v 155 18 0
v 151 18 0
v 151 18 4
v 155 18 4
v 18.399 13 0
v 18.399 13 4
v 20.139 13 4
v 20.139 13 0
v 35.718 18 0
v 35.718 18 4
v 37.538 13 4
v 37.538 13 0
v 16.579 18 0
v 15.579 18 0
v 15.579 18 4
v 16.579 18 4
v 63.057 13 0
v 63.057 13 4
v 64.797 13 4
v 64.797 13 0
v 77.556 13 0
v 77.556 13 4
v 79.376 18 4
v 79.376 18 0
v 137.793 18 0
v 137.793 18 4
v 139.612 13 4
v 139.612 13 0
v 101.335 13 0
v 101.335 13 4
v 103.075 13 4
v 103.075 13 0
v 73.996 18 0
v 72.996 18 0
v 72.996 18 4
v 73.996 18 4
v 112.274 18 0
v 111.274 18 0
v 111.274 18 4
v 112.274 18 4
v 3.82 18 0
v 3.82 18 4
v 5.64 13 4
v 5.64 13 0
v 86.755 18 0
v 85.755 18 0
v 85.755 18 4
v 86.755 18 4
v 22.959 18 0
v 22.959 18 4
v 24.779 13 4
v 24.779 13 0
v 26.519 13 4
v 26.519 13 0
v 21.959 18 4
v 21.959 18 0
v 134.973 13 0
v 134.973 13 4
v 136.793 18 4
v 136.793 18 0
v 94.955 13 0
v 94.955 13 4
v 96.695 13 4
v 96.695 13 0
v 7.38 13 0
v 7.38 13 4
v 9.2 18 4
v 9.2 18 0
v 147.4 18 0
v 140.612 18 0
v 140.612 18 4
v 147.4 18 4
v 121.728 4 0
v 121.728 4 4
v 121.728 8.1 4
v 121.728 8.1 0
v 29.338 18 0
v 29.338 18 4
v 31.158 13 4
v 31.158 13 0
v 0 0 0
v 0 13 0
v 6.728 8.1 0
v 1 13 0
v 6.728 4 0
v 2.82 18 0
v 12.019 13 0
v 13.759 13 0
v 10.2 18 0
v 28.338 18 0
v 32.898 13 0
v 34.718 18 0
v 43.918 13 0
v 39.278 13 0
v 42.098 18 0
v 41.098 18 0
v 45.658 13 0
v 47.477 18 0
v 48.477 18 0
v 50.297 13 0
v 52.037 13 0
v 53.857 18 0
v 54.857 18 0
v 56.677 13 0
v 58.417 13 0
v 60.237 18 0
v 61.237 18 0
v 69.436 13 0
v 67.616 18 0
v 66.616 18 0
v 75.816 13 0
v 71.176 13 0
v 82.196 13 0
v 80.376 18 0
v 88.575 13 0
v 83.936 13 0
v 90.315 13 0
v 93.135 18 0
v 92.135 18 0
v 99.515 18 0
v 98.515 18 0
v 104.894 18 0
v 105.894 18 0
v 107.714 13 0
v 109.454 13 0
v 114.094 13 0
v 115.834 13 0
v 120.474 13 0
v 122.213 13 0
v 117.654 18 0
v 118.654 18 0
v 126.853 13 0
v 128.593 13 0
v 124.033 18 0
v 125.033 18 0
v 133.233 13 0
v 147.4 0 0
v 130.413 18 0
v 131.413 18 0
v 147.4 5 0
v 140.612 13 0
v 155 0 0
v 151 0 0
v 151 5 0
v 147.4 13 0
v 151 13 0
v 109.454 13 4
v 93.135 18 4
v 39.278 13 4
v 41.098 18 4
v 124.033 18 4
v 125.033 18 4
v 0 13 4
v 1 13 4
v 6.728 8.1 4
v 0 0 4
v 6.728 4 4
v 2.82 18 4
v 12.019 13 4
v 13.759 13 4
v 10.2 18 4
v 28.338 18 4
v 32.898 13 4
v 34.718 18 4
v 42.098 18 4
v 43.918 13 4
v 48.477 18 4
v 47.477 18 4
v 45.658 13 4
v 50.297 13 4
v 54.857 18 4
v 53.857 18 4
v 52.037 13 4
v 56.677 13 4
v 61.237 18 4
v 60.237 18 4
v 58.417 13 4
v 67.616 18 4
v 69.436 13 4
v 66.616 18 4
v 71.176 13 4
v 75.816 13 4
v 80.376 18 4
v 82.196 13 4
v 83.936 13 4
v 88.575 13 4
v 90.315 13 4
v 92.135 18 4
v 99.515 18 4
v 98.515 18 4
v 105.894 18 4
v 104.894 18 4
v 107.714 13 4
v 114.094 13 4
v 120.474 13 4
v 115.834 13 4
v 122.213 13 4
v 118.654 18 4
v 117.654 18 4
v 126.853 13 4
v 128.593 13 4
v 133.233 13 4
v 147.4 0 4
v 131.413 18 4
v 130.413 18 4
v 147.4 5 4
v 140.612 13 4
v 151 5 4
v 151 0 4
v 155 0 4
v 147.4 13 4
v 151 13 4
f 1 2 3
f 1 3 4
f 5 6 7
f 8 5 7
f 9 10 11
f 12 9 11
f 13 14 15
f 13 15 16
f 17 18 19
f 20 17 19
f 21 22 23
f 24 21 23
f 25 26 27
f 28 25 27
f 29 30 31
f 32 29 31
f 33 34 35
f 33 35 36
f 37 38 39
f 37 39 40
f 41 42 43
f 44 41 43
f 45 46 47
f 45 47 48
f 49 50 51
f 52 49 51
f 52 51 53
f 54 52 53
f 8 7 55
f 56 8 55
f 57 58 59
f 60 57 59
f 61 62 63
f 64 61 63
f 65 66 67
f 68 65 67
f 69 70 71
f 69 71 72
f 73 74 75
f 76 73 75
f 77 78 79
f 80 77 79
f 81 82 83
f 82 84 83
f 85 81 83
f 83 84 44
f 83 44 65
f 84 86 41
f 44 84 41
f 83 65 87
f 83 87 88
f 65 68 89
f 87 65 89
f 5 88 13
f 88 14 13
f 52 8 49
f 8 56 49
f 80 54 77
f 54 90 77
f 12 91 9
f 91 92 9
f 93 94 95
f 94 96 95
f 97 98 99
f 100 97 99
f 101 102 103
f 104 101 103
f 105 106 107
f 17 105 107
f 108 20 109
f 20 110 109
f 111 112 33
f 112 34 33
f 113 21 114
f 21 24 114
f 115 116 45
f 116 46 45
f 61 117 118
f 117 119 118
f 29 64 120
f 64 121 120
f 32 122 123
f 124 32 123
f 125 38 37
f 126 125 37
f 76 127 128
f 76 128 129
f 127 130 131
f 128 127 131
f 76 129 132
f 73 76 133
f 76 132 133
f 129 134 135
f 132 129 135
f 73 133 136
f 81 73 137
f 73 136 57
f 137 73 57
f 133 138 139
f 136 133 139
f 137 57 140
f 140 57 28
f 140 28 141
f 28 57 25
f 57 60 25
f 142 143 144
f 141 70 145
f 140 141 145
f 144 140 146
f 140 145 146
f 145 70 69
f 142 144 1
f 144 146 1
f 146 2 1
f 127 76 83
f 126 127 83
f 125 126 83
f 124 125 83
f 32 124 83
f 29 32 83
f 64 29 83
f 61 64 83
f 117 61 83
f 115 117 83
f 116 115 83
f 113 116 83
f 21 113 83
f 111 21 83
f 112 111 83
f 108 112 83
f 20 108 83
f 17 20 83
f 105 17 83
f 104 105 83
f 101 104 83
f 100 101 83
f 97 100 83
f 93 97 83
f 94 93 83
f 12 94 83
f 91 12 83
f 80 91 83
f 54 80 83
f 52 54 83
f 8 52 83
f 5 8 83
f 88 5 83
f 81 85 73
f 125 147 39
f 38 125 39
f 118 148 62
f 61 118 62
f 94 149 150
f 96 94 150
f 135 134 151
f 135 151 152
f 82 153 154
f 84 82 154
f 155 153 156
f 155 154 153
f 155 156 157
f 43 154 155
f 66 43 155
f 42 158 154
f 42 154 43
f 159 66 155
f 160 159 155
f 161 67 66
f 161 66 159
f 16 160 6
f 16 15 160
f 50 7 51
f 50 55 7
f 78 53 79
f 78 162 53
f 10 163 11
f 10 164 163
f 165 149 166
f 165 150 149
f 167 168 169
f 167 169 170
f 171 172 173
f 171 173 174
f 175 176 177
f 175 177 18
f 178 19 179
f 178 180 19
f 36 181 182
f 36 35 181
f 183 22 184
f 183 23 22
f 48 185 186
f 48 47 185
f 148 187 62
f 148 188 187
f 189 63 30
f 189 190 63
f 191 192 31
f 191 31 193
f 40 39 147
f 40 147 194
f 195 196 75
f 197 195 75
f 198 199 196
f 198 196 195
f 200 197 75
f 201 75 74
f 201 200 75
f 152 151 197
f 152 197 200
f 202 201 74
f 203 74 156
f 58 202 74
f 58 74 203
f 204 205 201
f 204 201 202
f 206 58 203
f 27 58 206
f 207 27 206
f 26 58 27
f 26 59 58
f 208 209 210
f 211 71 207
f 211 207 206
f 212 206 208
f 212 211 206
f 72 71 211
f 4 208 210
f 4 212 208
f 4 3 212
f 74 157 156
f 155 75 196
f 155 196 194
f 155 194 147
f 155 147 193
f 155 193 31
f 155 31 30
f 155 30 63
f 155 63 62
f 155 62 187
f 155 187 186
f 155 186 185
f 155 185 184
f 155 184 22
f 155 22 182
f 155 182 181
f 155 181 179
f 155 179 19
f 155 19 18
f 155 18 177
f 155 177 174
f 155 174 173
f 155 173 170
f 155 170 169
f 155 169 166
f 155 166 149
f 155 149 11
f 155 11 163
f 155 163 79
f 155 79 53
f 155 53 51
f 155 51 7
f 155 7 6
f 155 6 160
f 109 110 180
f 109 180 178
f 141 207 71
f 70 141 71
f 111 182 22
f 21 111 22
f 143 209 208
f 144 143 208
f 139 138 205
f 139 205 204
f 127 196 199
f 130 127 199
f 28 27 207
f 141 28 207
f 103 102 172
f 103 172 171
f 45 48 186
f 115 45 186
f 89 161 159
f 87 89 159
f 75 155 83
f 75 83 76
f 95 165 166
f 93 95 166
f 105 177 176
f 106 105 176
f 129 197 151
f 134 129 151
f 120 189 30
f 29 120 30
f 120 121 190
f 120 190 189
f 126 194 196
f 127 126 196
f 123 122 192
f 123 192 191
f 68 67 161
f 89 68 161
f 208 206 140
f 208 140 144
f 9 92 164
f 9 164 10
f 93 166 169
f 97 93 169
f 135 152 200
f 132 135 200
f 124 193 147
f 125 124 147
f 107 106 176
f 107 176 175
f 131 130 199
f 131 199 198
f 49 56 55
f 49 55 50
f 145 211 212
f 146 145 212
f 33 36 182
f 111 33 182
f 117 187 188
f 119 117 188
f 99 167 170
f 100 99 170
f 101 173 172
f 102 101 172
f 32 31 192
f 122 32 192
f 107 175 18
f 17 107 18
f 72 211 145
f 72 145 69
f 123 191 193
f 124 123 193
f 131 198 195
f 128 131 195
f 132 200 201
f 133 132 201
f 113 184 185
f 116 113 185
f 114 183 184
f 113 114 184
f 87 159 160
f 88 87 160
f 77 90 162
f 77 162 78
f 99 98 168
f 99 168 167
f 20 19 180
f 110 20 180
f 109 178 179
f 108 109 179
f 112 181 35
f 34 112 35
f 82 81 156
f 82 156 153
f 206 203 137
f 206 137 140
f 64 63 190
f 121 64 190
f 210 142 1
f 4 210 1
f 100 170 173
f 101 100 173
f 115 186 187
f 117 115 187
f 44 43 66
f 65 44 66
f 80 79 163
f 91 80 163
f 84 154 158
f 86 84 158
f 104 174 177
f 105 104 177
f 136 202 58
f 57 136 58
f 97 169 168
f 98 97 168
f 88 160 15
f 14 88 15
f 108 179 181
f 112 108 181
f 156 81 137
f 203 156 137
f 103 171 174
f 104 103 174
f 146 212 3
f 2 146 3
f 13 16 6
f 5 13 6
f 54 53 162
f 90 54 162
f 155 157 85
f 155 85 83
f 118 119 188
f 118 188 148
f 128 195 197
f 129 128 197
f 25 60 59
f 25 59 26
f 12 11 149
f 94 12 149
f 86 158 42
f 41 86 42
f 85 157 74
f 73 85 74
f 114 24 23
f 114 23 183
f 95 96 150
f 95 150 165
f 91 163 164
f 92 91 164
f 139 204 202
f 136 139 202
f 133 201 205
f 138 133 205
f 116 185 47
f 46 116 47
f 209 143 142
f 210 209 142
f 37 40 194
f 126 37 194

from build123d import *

# Parameters (mm, degrees)
SKIZZE1_W                       = 155
SKIZZE1_H                       = 18
AUFSATZ_LINEAR_AUSTRAGEN1_DEPTH = 4
SCHNITT_LINEAR_AUSTRAGEN1_DEPTH = 4
LINEARES_MUSTER1_COUNT          = 22
LINEARES_MUSTER1_PITCH          = 6.379656485
SCHNITT_LINEAR_AUSTRAGEN2_REACH = 6
SKIZZE3_W                       = 115
SKIZZE3_H                       = 4.1
SCHNITT_LINEAR_AUSTRAGEN3_REACH = 6
SKIZZE4_W                       = 3.6
SKIZZE4_H                       = 5


with BuildPart() as part:
    # Skizze1 → Aufsatz-Linear austragen1 (new body)
    with BuildSketch(Plane.XY):
        with Locations((77.5, 9)):
            Rectangle(SKIZZE1_W, SKIZZE1_H)
    extrude(amount=AUFSATZ_LINEAR_AUSTRAGEN1_DEPTH)

    # Skizze2 → Schnitt-Linear austragen1 (cut)
    with BuildSketch(Plane.XY.offset(4)):
        Polygon((0, 13), (1, 13), (2.819851171, 18), (0, 18), align=None)
        Polygon((3.819851171, 18), (5.639702343, 13), (6.639702343, 13), (6.639702343, 18), align=None)
    schnitt_linear_austragen1 = extrude(amount=-SCHNITT_LINEAR_AUSTRAGEN1_DEPTH, mode=Mode.SUBTRACT)

    # Lineares Muster1: Schnitt-Linear austragen1 ×22
    with Locations(*[(i * LINEARES_MUSTER1_PITCH, 0, 0) for i in range(1, LINEARES_MUSTER1_COUNT)]):
        add(schnitt_linear_austragen1, mode=Mode.SUBTRACT)

    # Skizze3 → Schnitt-Linear austragen2 (cut, up to next)
    with BuildSketch(Plane.XY.offset(4), mode=Mode.PRIVATE) as schnitt_linear_austragen2_sk1:
        with Locations((64.227564671, 6.05)):
            Rectangle(SKIZZE3_W, SKIZZE3_H)
    schnitt_linear_austragen2_tool1 = extrude(schnitt_linear_austragen2_sk1.sketch, amount=-SCHNITT_LINEAR_AUSTRAGEN2_REACH, mode=Mode.PRIVATE) & part.part
    add(schnitt_linear_austragen2_tool1.solids().sort_by_distance((64.227565, 6.05, 4))[0], mode=Mode.SUBTRACT)

    # Skizze4 → Schnitt-Linear austragen3 (cut, up to next)
    with BuildSketch(Plane.XY.offset(4), mode=Mode.PRIVATE) as schnitt_linear_austragen3_sk1:
        with Locations((149.2, 15.5)):
            Rectangle(SKIZZE4_W, SKIZZE4_H)
    schnitt_linear_austragen3_tool1 = extrude(schnitt_linear_austragen3_sk1.sketch, amount=-SCHNITT_LINEAR_AUSTRAGEN3_REACH, mode=Mode.PRIVATE) & part.part
    add(schnitt_linear_austragen3_tool1.solids().sort_by_distance((149.2, 15.5, 4))[0], mode=Mode.SUBTRACT)
    # Skizze4 → Schnitt-Linear austragen3 (cut, up to next)
    with BuildSketch(Plane.XY.offset(4), mode=Mode.PRIVATE) as schnitt_linear_austragen3_sk2:
        with Locations((149.2, 2.5)):
            Rectangle(SKIZZE4_W, SKIZZE4_H)
    schnitt_linear_austragen3_tool2 = extrude(schnitt_linear_austragen3_sk2.sketch, amount=-SCHNITT_LINEAR_AUSTRAGEN3_REACH, mode=Mode.PRIVATE) & part.part
    add(schnitt_linear_austragen3_tool2.solids().sort_by_distance((149.2, 2.5, 4))[0], mode=Mode.SUBTRACT)


solid = part.part
